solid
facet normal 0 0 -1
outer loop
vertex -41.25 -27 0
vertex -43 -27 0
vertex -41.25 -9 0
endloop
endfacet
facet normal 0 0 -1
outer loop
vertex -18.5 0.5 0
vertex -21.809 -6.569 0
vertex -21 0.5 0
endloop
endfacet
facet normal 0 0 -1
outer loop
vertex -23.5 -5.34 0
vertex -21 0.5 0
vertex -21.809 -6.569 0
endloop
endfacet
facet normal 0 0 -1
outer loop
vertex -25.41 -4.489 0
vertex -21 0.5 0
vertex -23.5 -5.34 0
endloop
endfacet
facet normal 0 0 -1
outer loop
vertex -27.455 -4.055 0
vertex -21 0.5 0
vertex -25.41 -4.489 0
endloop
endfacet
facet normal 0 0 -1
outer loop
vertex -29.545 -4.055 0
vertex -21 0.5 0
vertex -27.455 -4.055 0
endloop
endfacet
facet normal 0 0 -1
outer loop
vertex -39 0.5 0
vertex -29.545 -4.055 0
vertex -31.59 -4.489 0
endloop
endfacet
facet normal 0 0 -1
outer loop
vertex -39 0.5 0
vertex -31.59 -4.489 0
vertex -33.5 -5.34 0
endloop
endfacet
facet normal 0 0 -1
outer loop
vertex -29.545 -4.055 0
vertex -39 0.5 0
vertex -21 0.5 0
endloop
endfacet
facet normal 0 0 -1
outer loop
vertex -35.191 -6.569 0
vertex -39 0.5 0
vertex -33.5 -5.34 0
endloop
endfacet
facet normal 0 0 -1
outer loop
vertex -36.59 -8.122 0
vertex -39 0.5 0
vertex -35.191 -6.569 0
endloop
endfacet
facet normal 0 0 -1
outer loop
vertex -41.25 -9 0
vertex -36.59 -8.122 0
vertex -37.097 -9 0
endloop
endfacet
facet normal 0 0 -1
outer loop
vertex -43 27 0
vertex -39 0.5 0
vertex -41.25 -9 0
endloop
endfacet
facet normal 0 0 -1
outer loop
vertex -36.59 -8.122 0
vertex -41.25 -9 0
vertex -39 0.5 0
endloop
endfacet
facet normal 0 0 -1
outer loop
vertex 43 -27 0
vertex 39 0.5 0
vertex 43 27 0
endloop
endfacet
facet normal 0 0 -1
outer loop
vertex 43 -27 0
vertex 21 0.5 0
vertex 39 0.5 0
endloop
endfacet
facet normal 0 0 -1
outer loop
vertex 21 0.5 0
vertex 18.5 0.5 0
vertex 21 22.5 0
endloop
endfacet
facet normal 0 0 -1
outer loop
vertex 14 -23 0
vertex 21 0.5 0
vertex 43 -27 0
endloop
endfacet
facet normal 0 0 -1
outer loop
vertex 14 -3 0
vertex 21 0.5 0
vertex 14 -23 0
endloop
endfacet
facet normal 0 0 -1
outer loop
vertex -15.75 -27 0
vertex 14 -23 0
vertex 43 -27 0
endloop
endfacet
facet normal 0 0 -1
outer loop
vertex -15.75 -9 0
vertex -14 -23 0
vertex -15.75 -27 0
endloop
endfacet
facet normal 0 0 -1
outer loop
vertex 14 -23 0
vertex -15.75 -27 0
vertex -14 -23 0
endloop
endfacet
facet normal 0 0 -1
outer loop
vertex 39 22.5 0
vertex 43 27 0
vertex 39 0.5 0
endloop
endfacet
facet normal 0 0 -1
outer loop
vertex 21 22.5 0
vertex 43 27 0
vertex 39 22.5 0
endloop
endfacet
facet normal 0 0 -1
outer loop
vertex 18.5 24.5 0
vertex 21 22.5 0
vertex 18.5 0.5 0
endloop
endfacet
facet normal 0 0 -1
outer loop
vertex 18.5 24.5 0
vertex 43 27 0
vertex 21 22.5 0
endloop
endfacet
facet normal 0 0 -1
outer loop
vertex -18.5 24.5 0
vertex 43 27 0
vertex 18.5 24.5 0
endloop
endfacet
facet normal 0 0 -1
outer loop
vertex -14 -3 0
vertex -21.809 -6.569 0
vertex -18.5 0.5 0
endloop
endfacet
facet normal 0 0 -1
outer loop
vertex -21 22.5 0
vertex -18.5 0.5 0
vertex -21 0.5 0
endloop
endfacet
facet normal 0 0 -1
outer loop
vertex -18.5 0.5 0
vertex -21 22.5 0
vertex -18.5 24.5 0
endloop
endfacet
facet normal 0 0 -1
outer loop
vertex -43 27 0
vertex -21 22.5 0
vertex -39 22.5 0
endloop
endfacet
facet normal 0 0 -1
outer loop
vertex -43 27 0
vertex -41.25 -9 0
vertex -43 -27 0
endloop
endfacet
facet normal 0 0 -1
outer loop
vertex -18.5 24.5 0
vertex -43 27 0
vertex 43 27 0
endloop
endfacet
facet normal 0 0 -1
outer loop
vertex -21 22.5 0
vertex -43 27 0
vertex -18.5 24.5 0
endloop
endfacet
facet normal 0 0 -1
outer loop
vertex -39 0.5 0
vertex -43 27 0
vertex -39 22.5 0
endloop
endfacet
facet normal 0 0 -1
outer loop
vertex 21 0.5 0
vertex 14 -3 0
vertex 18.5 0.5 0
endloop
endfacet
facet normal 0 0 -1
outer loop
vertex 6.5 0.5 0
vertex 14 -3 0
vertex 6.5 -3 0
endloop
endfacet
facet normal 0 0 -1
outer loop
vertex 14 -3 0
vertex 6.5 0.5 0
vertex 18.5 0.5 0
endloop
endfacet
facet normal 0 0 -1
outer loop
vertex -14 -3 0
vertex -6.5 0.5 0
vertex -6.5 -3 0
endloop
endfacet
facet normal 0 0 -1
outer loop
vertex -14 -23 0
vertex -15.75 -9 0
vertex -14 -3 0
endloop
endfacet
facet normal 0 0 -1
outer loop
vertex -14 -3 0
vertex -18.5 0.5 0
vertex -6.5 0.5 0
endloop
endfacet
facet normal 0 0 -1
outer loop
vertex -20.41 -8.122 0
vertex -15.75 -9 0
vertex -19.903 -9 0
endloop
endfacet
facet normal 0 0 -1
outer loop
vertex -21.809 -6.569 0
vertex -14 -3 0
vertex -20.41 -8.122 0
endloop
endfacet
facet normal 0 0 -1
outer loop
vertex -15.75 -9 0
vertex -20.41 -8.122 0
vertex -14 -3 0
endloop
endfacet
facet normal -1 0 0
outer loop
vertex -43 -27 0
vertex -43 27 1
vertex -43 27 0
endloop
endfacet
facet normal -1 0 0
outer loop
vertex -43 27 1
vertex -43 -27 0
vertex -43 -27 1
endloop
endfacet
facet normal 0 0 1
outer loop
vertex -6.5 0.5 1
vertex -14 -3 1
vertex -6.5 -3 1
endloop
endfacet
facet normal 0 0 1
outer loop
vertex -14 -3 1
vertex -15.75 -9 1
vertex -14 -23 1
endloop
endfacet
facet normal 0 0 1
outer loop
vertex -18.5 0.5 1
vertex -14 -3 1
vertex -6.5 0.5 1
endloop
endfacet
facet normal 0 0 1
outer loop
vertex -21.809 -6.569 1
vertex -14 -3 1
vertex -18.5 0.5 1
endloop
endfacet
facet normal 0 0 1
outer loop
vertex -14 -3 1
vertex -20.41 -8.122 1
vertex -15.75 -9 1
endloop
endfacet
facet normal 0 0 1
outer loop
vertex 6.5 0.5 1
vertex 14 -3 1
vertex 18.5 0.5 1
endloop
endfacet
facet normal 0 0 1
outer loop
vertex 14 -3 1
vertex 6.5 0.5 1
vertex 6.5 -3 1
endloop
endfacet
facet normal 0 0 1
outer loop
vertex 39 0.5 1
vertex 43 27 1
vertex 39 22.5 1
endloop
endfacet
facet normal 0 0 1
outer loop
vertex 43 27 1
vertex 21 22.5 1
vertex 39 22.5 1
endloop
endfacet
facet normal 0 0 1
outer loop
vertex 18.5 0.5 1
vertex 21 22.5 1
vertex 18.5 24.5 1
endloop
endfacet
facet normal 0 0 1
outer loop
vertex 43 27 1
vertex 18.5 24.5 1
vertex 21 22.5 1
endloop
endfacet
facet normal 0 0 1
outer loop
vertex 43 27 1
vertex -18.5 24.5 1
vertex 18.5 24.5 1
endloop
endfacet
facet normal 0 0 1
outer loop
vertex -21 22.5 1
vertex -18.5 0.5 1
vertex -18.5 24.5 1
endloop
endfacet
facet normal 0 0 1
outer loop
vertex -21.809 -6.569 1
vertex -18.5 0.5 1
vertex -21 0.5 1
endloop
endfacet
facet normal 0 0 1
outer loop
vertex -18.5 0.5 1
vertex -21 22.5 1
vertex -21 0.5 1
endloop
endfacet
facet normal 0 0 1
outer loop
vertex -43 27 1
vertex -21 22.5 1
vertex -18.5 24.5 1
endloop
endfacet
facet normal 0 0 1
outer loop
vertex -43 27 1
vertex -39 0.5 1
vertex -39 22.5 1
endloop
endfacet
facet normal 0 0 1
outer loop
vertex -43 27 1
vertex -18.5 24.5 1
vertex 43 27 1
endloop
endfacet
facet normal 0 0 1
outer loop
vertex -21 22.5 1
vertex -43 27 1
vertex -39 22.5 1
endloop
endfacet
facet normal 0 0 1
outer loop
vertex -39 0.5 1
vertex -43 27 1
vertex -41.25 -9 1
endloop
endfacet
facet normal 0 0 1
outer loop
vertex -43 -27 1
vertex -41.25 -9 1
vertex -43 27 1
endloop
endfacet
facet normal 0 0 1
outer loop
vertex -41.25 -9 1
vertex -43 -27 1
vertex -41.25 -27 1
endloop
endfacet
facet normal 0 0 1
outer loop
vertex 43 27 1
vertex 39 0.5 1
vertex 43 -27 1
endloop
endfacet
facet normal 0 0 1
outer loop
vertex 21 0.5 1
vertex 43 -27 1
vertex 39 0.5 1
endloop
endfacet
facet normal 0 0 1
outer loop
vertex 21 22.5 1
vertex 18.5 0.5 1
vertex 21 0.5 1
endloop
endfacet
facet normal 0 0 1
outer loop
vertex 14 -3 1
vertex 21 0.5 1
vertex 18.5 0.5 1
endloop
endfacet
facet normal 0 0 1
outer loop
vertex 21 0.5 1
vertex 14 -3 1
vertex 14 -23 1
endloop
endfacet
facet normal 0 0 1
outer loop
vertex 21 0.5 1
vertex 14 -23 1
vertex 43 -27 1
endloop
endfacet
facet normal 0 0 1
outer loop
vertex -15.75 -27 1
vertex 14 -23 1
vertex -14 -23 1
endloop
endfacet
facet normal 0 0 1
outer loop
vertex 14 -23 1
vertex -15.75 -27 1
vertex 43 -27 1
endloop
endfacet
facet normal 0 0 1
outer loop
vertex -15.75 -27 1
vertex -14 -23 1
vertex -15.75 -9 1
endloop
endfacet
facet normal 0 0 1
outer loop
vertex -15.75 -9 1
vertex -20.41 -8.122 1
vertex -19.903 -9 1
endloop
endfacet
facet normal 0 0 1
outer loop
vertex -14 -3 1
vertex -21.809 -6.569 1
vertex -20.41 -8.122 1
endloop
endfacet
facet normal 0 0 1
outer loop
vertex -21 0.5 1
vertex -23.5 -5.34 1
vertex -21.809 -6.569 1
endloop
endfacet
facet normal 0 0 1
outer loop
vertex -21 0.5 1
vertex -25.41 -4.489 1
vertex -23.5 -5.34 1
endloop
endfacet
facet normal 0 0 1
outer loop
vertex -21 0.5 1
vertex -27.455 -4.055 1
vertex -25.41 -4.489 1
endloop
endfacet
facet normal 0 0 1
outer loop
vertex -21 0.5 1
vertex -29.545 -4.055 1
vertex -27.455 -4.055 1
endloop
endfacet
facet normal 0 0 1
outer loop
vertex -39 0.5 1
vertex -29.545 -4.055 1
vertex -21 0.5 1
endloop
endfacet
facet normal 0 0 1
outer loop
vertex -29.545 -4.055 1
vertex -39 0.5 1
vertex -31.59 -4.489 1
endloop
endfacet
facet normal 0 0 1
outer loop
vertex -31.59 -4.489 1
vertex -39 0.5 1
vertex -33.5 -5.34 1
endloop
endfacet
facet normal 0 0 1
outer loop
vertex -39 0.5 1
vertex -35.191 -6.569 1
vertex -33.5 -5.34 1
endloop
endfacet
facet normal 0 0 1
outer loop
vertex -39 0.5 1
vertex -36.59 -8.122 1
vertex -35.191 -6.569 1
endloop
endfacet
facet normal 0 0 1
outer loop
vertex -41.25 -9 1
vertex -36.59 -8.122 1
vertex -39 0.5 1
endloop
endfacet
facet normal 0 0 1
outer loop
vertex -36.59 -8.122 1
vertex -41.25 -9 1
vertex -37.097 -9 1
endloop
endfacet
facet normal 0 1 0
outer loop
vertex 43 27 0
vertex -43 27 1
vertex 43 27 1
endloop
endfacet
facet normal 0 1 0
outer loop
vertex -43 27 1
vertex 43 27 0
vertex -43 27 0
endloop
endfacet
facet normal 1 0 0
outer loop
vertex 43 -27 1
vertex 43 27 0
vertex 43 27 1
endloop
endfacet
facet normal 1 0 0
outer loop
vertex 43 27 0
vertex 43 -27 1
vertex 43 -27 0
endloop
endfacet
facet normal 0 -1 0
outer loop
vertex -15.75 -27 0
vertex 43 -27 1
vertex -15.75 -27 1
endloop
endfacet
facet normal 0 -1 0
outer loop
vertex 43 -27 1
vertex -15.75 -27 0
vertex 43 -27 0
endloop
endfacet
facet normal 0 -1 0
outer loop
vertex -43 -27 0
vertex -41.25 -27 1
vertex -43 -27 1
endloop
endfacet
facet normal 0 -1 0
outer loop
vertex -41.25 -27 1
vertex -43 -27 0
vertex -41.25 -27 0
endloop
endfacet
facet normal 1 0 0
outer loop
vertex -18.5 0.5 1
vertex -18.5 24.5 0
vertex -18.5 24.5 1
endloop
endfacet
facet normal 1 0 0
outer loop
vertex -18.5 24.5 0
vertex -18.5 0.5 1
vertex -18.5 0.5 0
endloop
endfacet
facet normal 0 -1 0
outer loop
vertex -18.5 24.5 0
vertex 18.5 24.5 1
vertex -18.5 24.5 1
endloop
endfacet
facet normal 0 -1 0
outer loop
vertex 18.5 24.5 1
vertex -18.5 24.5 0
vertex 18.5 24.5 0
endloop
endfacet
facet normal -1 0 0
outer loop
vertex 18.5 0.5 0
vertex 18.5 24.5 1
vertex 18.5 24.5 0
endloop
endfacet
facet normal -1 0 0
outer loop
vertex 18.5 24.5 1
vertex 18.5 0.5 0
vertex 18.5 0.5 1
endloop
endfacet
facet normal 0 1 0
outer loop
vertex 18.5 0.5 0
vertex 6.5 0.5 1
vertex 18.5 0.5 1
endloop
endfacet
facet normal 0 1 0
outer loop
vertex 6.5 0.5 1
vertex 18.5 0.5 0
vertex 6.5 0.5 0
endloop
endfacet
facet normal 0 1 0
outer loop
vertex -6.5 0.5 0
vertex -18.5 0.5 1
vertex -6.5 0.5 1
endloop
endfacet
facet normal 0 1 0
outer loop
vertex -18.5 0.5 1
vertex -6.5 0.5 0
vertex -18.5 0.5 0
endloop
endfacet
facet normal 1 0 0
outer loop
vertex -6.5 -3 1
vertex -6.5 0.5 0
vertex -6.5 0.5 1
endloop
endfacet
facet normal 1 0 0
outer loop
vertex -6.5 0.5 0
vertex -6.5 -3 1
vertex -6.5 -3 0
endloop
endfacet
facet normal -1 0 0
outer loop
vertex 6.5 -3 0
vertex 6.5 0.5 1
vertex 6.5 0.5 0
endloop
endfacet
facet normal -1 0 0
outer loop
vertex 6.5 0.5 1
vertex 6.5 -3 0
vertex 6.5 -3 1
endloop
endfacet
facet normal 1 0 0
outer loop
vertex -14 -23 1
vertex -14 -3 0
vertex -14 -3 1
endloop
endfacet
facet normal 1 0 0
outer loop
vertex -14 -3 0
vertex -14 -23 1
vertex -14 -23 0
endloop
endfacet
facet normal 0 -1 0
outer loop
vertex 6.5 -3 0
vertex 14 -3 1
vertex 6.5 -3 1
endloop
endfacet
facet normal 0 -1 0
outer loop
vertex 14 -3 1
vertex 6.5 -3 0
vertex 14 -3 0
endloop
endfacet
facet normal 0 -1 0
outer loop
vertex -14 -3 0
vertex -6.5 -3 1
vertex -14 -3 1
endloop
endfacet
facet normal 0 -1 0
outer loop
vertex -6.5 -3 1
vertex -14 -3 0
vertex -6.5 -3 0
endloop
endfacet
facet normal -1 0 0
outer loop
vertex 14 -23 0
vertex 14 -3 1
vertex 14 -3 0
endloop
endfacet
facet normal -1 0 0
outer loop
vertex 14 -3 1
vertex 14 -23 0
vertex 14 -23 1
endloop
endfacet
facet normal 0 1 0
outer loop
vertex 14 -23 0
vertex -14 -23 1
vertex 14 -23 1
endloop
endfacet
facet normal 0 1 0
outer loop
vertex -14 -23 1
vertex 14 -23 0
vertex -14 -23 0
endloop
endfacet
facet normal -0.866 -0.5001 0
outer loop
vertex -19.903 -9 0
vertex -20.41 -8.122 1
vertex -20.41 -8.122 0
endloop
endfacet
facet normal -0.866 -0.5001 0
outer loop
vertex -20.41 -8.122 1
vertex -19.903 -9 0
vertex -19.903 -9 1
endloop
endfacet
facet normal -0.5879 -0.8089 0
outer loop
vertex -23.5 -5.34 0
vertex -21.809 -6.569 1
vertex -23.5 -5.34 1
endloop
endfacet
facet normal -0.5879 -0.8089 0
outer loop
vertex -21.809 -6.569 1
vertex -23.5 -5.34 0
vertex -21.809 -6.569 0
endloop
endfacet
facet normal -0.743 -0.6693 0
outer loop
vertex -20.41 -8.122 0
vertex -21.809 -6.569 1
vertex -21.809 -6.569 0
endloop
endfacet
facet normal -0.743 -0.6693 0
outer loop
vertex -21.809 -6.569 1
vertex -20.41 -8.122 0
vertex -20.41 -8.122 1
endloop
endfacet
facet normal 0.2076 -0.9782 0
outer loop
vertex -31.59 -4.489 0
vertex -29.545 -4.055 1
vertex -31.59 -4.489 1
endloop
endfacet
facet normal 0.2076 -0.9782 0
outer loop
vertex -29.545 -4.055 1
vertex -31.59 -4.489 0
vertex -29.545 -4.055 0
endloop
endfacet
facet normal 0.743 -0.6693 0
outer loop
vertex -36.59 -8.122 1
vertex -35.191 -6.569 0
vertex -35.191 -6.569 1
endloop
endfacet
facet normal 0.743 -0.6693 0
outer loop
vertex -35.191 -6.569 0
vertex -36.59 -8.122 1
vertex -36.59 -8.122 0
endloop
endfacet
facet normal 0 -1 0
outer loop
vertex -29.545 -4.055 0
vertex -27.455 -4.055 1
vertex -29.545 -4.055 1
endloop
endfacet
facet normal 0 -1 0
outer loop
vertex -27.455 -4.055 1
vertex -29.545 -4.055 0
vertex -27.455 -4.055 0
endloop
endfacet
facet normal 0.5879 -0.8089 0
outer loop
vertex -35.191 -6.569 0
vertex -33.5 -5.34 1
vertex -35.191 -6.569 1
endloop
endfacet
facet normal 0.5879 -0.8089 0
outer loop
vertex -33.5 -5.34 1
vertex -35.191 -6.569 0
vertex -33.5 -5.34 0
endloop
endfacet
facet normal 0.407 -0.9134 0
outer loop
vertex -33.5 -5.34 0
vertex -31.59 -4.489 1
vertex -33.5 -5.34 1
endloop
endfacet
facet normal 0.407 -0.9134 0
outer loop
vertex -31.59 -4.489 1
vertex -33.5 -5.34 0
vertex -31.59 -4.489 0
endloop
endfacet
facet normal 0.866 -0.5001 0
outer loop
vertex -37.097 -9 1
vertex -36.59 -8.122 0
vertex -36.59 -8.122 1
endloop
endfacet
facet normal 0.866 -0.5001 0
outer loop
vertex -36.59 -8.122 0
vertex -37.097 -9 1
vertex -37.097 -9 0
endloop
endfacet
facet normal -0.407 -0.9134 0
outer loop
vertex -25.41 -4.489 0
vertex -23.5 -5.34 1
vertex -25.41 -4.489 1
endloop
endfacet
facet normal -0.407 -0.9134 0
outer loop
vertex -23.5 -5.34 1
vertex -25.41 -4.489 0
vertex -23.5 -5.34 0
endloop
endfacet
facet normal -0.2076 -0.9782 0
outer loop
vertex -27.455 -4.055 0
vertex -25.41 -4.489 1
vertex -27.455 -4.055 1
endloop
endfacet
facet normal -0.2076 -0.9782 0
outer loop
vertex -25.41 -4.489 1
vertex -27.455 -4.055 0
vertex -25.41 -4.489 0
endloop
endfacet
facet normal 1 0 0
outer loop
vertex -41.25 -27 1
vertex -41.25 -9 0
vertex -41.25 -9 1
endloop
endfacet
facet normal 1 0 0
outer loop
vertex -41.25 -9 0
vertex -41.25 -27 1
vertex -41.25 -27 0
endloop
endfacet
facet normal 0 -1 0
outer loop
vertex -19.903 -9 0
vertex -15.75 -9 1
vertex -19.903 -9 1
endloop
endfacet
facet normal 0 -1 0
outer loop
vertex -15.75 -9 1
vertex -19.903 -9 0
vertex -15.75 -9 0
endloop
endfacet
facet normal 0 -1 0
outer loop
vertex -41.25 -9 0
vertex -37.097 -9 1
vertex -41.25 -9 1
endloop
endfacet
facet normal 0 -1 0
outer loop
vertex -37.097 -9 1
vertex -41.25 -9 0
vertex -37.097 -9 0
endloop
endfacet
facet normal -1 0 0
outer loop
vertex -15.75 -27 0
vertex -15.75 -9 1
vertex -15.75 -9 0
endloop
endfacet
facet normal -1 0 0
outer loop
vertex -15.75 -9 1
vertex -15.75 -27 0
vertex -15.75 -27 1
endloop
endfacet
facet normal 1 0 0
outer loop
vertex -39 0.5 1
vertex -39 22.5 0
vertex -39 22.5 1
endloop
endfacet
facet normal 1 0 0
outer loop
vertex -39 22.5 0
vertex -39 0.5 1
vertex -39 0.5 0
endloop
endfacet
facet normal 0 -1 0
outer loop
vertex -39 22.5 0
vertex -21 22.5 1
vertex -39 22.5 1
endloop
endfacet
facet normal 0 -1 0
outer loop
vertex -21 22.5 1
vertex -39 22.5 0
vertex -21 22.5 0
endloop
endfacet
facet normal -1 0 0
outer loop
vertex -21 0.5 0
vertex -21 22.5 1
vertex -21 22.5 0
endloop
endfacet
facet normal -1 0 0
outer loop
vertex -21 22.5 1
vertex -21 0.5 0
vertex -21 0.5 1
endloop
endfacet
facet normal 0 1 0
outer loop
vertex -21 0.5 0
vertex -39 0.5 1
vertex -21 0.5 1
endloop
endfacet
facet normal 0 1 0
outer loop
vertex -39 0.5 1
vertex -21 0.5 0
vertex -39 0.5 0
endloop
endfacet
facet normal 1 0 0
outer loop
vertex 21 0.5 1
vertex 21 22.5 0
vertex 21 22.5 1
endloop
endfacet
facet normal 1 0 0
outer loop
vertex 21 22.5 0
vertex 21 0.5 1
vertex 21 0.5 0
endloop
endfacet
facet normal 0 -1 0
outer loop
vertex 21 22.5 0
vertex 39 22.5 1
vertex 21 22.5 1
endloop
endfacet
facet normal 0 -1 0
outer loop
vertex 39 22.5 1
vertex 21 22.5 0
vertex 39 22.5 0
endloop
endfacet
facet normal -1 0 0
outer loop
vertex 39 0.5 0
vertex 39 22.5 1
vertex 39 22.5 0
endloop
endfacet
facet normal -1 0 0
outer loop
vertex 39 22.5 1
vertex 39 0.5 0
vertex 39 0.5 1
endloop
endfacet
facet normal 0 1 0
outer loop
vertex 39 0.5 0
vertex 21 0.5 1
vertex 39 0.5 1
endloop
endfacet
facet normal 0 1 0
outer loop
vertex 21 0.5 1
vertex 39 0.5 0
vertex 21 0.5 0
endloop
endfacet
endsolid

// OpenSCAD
width = 86;
height = 54;
thickness = 1;
electronicsWidth = 37;
electronicsHeight = 24;
electronicsOffset = 2.5;
connectorWidth = 13;
screenWidth = 28;
screenHeight = 20;
screenOffset = 4;
batteryDiameter = 20;
batteryOffsetX = 14.5;
batteryOffsetY = 13;
batteryHolderWidth = 25.5;
batteryHolderHeight = 18;
padWidth = 18;
padHeight = 22;
padOffsetY = 15.5;
padOffsetX = 4;

difference() {
    linear_extrude(thickness)
        square([width, height], true);
    translate([0, height/2-electronicsHeight/2-electronicsOffset])
        linear_extrude(thickness)
            square([electronicsWidth, electronicsHeight], true);   
    linear_extrude(thickness)
        square([connectorWidth, 30], true);      
    translate([0, -height/2+screenHeight/2+screenOffset])
        linear_extrude(thickness)
            square([screenWidth, screenHeight], true); 
    translate([-width/2+batteryOffsetX, -height/2+batteryOffsetY])  
        cylinder(r=batteryDiameter/2, h=thickness);
    translate([-width/2+batteryOffsetX, -height/2+batteryHolderHeight/2])  
        linear_extrude(thickness)
            square([batteryHolderWidth, batteryHolderHeight], true); 
    translate([-width/2+padWidth/2+padOffsetX, height/2-padOffsetY])  
        linear_extrude(thickness)
            square([padWidth, padHeight], true); 
    translate([+width/2-padWidth/2-padOffsetX, height/2-padOffsetY])  
        linear_extrude(thickness)
            square([padWidth, padHeight], true);     
}
